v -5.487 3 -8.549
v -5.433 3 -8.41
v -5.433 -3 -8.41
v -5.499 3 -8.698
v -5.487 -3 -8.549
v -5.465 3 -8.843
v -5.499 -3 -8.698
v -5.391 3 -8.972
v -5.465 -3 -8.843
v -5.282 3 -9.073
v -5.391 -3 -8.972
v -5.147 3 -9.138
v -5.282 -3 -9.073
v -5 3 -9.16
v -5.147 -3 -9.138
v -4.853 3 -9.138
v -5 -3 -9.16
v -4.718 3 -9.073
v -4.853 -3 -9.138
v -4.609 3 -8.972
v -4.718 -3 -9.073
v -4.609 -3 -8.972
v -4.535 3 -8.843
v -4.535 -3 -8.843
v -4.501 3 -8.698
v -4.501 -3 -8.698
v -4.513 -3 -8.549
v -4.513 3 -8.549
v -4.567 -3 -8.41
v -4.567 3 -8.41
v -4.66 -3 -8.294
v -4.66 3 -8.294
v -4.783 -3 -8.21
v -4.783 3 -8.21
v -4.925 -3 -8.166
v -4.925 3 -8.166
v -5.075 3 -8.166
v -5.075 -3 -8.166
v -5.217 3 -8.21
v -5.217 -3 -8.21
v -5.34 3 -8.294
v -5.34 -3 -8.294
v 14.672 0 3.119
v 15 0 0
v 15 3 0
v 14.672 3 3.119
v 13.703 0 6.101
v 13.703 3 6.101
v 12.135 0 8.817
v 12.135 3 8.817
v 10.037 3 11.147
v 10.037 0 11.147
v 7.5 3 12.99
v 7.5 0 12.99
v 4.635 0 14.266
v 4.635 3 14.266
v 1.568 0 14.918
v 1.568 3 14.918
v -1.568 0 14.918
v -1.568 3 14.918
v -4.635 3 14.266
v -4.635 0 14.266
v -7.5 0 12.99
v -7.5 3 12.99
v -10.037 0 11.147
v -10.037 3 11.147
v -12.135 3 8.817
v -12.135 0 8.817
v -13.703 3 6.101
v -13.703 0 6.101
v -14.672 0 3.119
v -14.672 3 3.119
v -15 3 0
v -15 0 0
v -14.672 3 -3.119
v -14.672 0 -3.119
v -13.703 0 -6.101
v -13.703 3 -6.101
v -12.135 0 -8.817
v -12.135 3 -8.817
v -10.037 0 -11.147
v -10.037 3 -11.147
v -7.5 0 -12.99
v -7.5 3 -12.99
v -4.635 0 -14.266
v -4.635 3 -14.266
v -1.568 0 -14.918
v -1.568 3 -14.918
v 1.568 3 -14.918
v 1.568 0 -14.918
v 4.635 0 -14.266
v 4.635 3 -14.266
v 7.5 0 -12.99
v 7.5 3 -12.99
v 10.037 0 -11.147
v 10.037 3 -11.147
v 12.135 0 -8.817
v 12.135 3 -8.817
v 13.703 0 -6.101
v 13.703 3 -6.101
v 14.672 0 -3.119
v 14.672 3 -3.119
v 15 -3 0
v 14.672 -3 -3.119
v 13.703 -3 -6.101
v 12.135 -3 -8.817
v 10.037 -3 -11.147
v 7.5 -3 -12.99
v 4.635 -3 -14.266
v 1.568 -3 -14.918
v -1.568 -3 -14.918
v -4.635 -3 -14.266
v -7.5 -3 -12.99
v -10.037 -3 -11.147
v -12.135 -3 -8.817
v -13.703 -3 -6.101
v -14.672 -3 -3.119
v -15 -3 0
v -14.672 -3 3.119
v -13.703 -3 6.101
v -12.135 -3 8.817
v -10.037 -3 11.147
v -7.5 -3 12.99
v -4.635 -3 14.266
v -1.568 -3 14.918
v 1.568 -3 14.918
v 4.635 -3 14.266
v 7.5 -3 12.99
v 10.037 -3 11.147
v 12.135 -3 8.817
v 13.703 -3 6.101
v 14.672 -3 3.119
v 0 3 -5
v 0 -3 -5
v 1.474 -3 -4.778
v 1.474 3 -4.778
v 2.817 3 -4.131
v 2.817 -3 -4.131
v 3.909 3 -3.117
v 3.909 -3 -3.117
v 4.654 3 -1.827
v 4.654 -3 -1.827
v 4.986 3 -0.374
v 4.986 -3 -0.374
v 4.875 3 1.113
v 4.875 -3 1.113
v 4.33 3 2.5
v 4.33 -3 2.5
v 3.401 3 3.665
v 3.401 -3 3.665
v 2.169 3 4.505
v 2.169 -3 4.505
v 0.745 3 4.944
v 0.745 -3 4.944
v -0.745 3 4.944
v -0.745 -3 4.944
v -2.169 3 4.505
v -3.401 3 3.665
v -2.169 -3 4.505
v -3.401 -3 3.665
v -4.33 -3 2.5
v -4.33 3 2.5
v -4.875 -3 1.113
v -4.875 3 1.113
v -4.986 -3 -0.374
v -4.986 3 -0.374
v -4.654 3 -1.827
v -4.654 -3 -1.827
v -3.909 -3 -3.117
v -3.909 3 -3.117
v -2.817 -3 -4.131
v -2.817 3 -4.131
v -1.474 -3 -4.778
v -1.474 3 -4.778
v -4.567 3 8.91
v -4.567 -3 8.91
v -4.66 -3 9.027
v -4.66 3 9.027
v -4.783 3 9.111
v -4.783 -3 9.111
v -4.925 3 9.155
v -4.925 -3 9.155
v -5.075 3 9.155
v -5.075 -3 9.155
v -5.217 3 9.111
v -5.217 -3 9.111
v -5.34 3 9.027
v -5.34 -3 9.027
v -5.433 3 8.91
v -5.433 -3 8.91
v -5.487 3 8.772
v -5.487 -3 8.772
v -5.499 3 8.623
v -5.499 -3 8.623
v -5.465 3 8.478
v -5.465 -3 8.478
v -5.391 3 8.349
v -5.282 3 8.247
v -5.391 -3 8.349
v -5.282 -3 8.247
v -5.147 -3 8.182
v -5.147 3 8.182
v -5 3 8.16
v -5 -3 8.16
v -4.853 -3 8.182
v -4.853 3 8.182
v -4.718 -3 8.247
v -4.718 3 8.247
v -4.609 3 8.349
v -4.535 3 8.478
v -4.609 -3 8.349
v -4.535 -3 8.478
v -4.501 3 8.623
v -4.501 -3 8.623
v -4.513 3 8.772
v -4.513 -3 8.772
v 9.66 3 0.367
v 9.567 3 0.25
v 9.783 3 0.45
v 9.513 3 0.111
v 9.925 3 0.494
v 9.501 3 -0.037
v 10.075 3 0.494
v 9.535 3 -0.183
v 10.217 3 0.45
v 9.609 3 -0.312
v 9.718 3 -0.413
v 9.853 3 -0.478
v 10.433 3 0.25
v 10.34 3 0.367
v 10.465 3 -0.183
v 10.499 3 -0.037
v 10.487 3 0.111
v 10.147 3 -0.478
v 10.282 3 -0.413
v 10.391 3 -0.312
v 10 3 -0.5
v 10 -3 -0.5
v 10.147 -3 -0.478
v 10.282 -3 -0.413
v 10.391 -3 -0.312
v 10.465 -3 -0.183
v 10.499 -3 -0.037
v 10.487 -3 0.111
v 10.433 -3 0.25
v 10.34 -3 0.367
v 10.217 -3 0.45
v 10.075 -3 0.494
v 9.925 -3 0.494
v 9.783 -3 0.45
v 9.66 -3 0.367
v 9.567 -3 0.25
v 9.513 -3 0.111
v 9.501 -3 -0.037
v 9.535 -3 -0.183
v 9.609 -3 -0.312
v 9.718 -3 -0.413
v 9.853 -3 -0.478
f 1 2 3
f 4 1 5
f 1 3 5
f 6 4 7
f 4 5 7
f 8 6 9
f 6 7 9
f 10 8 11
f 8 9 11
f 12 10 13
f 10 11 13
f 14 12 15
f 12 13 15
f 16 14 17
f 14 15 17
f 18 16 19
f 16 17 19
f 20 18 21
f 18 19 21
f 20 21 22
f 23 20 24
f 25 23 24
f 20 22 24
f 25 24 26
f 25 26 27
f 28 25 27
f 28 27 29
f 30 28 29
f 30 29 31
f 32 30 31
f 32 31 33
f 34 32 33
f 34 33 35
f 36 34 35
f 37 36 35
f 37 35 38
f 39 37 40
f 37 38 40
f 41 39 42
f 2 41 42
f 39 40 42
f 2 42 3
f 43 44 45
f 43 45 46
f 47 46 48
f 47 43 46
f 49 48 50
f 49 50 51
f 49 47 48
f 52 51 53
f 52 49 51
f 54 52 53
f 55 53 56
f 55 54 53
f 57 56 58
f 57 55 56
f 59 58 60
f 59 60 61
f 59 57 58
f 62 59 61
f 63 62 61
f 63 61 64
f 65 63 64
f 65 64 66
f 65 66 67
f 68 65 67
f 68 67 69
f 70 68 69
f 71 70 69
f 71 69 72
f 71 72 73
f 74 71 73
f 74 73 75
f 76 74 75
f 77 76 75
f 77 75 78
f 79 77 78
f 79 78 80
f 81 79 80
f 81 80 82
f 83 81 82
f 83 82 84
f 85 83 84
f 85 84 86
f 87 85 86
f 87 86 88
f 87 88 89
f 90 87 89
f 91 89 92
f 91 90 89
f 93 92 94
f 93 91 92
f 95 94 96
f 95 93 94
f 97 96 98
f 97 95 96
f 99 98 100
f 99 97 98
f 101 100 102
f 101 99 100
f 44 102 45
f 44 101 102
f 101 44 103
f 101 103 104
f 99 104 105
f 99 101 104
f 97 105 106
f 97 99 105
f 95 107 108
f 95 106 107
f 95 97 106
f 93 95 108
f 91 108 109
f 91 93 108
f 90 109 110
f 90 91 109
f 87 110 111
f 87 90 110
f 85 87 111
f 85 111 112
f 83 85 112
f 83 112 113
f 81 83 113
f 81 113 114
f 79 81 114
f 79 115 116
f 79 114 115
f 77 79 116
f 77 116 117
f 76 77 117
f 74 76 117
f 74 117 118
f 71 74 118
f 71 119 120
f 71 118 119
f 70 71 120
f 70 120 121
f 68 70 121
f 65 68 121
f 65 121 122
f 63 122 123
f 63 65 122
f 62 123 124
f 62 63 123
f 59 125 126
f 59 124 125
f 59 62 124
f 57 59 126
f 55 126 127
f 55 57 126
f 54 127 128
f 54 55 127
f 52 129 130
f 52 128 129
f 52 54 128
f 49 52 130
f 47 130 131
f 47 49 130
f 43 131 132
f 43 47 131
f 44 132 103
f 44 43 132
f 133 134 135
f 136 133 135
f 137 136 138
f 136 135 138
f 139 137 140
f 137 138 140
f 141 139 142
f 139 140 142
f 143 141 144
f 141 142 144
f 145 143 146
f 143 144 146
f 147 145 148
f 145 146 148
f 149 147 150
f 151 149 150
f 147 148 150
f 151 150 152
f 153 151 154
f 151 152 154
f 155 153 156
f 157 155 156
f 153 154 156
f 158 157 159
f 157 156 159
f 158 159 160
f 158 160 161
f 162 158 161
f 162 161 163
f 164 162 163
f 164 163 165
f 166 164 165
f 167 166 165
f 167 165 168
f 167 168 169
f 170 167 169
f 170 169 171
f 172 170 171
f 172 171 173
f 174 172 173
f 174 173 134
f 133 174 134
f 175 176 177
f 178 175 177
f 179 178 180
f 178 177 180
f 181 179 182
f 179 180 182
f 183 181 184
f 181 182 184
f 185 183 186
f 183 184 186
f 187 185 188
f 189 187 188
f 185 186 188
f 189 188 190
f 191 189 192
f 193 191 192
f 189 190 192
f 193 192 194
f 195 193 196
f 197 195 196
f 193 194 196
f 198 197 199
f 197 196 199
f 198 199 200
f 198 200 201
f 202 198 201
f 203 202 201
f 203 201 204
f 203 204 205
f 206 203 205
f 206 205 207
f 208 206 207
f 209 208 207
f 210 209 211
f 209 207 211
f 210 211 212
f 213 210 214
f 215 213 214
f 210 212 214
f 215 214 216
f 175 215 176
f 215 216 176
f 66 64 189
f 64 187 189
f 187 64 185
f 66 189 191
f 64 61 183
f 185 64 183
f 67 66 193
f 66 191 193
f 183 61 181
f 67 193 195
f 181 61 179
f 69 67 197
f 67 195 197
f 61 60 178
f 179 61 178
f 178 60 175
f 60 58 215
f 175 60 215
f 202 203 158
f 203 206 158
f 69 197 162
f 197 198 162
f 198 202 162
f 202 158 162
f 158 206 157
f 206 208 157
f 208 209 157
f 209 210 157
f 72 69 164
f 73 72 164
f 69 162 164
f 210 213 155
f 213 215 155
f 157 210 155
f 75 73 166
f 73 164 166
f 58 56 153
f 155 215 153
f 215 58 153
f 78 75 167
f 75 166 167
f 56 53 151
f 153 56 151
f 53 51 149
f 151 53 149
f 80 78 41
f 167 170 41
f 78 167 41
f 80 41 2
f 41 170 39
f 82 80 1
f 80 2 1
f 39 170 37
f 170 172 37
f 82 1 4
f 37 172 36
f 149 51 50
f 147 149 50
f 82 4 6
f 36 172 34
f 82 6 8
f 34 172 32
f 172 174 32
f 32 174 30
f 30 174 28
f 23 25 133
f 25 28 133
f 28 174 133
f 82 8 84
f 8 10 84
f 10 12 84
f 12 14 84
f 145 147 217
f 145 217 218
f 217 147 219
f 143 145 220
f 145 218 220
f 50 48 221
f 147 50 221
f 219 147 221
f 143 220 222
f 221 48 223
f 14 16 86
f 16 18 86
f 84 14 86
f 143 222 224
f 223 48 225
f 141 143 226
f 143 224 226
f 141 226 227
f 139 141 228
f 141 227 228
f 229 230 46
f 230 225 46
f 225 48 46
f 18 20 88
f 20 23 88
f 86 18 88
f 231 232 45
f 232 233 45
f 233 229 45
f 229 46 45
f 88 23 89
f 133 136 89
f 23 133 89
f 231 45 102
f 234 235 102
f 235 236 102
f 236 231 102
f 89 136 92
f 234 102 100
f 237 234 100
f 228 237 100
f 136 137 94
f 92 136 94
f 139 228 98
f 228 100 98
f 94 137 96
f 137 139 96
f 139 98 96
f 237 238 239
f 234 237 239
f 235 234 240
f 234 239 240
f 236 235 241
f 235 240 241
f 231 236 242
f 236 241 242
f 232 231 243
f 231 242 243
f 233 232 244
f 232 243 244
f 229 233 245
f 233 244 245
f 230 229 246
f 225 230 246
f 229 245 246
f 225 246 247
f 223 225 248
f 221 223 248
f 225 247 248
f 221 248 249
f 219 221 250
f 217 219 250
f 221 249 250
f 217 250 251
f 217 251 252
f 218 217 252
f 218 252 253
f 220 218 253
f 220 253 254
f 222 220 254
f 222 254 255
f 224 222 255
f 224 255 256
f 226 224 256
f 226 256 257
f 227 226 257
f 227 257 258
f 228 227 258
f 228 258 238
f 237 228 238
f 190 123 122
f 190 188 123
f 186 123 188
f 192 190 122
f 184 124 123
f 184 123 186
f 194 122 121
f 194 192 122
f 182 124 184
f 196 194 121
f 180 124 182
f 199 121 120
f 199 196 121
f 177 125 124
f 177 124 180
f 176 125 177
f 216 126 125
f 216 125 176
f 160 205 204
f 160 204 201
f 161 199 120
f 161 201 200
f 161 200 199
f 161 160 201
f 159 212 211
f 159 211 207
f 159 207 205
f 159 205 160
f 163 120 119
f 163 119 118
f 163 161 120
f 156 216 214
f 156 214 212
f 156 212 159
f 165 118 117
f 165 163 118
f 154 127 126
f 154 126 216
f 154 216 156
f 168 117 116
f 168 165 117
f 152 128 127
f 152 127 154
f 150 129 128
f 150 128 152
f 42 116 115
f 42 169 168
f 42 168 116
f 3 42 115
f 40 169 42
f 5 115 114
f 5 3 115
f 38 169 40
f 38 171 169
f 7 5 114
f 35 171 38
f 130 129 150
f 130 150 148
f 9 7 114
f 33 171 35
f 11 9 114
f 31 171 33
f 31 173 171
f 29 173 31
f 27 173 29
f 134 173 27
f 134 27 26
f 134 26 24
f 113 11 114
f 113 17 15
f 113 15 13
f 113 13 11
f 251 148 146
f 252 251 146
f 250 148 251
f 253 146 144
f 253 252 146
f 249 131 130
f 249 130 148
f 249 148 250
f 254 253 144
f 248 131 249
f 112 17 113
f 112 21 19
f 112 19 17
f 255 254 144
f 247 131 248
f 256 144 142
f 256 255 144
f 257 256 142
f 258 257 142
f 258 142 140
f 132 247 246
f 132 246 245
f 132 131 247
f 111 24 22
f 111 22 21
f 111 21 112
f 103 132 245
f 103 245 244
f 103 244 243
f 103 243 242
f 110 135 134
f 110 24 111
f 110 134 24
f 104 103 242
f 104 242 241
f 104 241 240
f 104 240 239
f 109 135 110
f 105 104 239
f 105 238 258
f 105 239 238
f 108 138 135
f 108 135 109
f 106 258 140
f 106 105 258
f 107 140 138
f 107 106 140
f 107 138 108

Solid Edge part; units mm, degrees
sketch "Sketch1" plane through (0, 0, 0) normal (0, -1, 0) x (1, 0, 0)
  circle A0 centre (0, 0) radius 15
extrude "Protrusion1" add sketch "Sketch1" along normal mid plane 6
hole "Bohrung_1" at (0, -3, 0) direction (0, 1, 0) diameter 10 end through all
hole "Bohrung_2" at (10, -3, 0) direction (0, 1, 0) diameter 1 end up to next
pattern_circular "Pattern1" count 3 over 360 about axis through (0, -3, 0) along (0, -1, 0) of "Bohrung_2"
properties part number "DV2" material "Grauguss 20"
